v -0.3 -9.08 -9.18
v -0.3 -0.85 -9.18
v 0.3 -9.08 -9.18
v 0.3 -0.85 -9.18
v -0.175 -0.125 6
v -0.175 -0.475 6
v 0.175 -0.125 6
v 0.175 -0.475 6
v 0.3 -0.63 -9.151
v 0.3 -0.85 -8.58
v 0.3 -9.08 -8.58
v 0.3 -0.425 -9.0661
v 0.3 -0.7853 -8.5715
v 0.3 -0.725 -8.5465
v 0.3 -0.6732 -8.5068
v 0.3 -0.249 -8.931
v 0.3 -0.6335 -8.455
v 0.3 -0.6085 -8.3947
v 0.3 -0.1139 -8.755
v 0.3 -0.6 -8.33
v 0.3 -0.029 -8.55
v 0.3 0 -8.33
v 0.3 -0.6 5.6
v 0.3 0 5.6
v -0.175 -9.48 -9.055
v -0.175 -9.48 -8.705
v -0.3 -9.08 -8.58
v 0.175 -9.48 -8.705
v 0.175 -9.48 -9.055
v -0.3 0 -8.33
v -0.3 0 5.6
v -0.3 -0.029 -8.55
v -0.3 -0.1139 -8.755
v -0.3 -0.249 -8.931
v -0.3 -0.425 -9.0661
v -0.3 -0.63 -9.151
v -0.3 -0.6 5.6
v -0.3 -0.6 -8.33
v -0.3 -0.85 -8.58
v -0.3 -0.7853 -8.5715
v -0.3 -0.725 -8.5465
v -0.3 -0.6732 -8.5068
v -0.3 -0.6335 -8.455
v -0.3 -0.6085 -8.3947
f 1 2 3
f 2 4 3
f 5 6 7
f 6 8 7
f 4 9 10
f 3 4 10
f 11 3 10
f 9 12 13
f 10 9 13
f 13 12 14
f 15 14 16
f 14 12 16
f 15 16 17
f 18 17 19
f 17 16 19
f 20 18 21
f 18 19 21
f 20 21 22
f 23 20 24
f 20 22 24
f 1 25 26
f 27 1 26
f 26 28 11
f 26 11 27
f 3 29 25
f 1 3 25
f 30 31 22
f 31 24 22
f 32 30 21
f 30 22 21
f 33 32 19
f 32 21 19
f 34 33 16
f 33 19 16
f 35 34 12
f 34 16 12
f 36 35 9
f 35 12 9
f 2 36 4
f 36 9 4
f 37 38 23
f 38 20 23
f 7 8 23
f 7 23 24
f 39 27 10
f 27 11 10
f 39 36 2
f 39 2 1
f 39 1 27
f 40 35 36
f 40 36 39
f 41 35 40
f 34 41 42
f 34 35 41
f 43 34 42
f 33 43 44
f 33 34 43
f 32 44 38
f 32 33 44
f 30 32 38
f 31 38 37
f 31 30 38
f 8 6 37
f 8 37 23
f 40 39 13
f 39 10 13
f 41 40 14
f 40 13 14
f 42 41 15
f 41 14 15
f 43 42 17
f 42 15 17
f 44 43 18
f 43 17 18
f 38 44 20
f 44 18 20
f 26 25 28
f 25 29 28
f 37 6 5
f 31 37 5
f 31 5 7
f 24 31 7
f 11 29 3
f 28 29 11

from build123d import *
from OCP.BRepFilletAPI import BRepFilletAPI_MakeChamfer

# Parameters (mm, degrees)
T_LE_DE_BASE_PLI_E1_DEPTH = 0.3
CHANFREIN1_SIZE           = 0.4
CHANFREIN1_SIZE2          = 0.125


# Sheet-metal steps are written as plain solids
with BuildPart() as part:
    # Esquisse2 → Tôle de base pliée1 (new, symmetric)
    with BuildSketch(Plane(origin=(0, 0, 0), x_dir=(0, 0, -1), z_dir=(1, 0, 0))):
        with BuildLine():
            Line((-6, 0), (0, 0))
            Line((0, 0), (8.33, 0))
            ThreePointArc((8.33, 0), (8.931040764, -0.248959236), (9.18, -0.85))
            Line((9.18, -0.85), (9.18, -9.48))
            Line((9.18, -9.48), (8.58, -9.48))
            Line((8.58, -9.48), (8.58, -0.85))
            ThreePointArc((8.58, -0.85), (8.506776695, -0.673223305), (8.33, -0.6))
            Line((8.33, -0.6), (0, -0.6))
            Line((0, -0.6), (-6, -0.6))
            Line((-6, -0.6), (-6, 0))
        make_face()
    extrude(amount=T_LE_DE_BASE_PLI_E1_DEPTH, both=True)

    # Chanfrein1: one chamfer whose edges measure the first distance from different faces: ONE call of the kernel's chamfer builder (chamfer() names one face for all edges)
    chanfrein1_edges_1 = [part.edges().sort_by_distance(p)[0] for p in [
        (-0.3, -9.48, -8.88),
        (-0.3, -0.3, 6),
    ]]
    chanfrein1_side_1 = [part.faces().sort_by_distance(p)[0] for p in [
        (-0.3, -0.178970053, -1.165),
    ]]
    chanfrein1_edges_2 = [part.edges().sort_by_distance(p)[0] for p in [
        (0, -0.6, 6),
    ]]
    chanfrein1_side_2 = [part.faces().sort_by_distance(p)[0] for p in [
        (0, -0.6, -1.165),
    ]]
    chanfrein1_edges_3 = [part.edges().sort_by_distance(p)[0] for p in [
        (0, 0, 6),
    ]]
    chanfrein1_side_3 = [part.faces().sort_by_distance(p)[0] for p in [
        (0, 0, -1.165),
    ]]
    chanfrein1_edges_4 = [part.edges().sort_by_distance(p)[0] for p in [
        (0, -9.48, -9.18),
    ]]
    chanfrein1_side_4 = [part.faces().sort_by_distance(p)[0] for p in [
        (0, -5.165, -9.18),
    ]]
    chanfrein1_edges_5 = [part.edges().sort_by_distance(p)[0] for p in [
        (0, -9.48, -8.58),
    ]]
    chanfrein1_side_5 = [part.faces().sort_by_distance(p)[0] for p in [
        (0, -5.165, -8.58),
    ]]
    chanfrein1_edges_6 = [part.edges().sort_by_distance(p)[0] for p in [
        (0.3, -0.3, 6),
        (0.3, -9.48, -8.88),
    ]]
    chanfrein1_side_6 = [part.faces().sort_by_distance(p)[0] for p in [
        (0.3, -0.178970053, -1.165),
    ]]
    chanfrein1 = BRepFilletAPI_MakeChamfer(part.part.solid().wrapped)
    for e in chanfrein1_edges_1:
        chanfrein1.Add(CHANFREIN1_SIZE, CHANFREIN1_SIZE2, e.wrapped, chanfrein1_side_1[0].wrapped)  # the first distance lies on this face
    for e in chanfrein1_edges_2:
        chanfrein1.Add(CHANFREIN1_SIZE, CHANFREIN1_SIZE2, e.wrapped, chanfrein1_side_2[0].wrapped)  # the first distance lies on this face
    for e in chanfrein1_edges_3:
        chanfrein1.Add(CHANFREIN1_SIZE, CHANFREIN1_SIZE2, e.wrapped, chanfrein1_side_3[0].wrapped)  # the first distance lies on this face
    for e in chanfrein1_edges_4:
        chanfrein1.Add(CHANFREIN1_SIZE, CHANFREIN1_SIZE2, e.wrapped, chanfrein1_side_4[0].wrapped)  # the first distance lies on this face
    for e in chanfrein1_edges_5:
        chanfrein1.Add(CHANFREIN1_SIZE, CHANFREIN1_SIZE2, e.wrapped, chanfrein1_side_5[0].wrapped)  # the first distance lies on this face
    for e in chanfrein1_edges_6:
        chanfrein1.Add(CHANFREIN1_SIZE, CHANFREIN1_SIZE2, e.wrapped, chanfrein1_side_6[0].wrapped)  # the first distance lies on this face
    add(Compound.cast(chanfrein1.Shape()), mode=Mode.REPLACE)


solid = part.part
